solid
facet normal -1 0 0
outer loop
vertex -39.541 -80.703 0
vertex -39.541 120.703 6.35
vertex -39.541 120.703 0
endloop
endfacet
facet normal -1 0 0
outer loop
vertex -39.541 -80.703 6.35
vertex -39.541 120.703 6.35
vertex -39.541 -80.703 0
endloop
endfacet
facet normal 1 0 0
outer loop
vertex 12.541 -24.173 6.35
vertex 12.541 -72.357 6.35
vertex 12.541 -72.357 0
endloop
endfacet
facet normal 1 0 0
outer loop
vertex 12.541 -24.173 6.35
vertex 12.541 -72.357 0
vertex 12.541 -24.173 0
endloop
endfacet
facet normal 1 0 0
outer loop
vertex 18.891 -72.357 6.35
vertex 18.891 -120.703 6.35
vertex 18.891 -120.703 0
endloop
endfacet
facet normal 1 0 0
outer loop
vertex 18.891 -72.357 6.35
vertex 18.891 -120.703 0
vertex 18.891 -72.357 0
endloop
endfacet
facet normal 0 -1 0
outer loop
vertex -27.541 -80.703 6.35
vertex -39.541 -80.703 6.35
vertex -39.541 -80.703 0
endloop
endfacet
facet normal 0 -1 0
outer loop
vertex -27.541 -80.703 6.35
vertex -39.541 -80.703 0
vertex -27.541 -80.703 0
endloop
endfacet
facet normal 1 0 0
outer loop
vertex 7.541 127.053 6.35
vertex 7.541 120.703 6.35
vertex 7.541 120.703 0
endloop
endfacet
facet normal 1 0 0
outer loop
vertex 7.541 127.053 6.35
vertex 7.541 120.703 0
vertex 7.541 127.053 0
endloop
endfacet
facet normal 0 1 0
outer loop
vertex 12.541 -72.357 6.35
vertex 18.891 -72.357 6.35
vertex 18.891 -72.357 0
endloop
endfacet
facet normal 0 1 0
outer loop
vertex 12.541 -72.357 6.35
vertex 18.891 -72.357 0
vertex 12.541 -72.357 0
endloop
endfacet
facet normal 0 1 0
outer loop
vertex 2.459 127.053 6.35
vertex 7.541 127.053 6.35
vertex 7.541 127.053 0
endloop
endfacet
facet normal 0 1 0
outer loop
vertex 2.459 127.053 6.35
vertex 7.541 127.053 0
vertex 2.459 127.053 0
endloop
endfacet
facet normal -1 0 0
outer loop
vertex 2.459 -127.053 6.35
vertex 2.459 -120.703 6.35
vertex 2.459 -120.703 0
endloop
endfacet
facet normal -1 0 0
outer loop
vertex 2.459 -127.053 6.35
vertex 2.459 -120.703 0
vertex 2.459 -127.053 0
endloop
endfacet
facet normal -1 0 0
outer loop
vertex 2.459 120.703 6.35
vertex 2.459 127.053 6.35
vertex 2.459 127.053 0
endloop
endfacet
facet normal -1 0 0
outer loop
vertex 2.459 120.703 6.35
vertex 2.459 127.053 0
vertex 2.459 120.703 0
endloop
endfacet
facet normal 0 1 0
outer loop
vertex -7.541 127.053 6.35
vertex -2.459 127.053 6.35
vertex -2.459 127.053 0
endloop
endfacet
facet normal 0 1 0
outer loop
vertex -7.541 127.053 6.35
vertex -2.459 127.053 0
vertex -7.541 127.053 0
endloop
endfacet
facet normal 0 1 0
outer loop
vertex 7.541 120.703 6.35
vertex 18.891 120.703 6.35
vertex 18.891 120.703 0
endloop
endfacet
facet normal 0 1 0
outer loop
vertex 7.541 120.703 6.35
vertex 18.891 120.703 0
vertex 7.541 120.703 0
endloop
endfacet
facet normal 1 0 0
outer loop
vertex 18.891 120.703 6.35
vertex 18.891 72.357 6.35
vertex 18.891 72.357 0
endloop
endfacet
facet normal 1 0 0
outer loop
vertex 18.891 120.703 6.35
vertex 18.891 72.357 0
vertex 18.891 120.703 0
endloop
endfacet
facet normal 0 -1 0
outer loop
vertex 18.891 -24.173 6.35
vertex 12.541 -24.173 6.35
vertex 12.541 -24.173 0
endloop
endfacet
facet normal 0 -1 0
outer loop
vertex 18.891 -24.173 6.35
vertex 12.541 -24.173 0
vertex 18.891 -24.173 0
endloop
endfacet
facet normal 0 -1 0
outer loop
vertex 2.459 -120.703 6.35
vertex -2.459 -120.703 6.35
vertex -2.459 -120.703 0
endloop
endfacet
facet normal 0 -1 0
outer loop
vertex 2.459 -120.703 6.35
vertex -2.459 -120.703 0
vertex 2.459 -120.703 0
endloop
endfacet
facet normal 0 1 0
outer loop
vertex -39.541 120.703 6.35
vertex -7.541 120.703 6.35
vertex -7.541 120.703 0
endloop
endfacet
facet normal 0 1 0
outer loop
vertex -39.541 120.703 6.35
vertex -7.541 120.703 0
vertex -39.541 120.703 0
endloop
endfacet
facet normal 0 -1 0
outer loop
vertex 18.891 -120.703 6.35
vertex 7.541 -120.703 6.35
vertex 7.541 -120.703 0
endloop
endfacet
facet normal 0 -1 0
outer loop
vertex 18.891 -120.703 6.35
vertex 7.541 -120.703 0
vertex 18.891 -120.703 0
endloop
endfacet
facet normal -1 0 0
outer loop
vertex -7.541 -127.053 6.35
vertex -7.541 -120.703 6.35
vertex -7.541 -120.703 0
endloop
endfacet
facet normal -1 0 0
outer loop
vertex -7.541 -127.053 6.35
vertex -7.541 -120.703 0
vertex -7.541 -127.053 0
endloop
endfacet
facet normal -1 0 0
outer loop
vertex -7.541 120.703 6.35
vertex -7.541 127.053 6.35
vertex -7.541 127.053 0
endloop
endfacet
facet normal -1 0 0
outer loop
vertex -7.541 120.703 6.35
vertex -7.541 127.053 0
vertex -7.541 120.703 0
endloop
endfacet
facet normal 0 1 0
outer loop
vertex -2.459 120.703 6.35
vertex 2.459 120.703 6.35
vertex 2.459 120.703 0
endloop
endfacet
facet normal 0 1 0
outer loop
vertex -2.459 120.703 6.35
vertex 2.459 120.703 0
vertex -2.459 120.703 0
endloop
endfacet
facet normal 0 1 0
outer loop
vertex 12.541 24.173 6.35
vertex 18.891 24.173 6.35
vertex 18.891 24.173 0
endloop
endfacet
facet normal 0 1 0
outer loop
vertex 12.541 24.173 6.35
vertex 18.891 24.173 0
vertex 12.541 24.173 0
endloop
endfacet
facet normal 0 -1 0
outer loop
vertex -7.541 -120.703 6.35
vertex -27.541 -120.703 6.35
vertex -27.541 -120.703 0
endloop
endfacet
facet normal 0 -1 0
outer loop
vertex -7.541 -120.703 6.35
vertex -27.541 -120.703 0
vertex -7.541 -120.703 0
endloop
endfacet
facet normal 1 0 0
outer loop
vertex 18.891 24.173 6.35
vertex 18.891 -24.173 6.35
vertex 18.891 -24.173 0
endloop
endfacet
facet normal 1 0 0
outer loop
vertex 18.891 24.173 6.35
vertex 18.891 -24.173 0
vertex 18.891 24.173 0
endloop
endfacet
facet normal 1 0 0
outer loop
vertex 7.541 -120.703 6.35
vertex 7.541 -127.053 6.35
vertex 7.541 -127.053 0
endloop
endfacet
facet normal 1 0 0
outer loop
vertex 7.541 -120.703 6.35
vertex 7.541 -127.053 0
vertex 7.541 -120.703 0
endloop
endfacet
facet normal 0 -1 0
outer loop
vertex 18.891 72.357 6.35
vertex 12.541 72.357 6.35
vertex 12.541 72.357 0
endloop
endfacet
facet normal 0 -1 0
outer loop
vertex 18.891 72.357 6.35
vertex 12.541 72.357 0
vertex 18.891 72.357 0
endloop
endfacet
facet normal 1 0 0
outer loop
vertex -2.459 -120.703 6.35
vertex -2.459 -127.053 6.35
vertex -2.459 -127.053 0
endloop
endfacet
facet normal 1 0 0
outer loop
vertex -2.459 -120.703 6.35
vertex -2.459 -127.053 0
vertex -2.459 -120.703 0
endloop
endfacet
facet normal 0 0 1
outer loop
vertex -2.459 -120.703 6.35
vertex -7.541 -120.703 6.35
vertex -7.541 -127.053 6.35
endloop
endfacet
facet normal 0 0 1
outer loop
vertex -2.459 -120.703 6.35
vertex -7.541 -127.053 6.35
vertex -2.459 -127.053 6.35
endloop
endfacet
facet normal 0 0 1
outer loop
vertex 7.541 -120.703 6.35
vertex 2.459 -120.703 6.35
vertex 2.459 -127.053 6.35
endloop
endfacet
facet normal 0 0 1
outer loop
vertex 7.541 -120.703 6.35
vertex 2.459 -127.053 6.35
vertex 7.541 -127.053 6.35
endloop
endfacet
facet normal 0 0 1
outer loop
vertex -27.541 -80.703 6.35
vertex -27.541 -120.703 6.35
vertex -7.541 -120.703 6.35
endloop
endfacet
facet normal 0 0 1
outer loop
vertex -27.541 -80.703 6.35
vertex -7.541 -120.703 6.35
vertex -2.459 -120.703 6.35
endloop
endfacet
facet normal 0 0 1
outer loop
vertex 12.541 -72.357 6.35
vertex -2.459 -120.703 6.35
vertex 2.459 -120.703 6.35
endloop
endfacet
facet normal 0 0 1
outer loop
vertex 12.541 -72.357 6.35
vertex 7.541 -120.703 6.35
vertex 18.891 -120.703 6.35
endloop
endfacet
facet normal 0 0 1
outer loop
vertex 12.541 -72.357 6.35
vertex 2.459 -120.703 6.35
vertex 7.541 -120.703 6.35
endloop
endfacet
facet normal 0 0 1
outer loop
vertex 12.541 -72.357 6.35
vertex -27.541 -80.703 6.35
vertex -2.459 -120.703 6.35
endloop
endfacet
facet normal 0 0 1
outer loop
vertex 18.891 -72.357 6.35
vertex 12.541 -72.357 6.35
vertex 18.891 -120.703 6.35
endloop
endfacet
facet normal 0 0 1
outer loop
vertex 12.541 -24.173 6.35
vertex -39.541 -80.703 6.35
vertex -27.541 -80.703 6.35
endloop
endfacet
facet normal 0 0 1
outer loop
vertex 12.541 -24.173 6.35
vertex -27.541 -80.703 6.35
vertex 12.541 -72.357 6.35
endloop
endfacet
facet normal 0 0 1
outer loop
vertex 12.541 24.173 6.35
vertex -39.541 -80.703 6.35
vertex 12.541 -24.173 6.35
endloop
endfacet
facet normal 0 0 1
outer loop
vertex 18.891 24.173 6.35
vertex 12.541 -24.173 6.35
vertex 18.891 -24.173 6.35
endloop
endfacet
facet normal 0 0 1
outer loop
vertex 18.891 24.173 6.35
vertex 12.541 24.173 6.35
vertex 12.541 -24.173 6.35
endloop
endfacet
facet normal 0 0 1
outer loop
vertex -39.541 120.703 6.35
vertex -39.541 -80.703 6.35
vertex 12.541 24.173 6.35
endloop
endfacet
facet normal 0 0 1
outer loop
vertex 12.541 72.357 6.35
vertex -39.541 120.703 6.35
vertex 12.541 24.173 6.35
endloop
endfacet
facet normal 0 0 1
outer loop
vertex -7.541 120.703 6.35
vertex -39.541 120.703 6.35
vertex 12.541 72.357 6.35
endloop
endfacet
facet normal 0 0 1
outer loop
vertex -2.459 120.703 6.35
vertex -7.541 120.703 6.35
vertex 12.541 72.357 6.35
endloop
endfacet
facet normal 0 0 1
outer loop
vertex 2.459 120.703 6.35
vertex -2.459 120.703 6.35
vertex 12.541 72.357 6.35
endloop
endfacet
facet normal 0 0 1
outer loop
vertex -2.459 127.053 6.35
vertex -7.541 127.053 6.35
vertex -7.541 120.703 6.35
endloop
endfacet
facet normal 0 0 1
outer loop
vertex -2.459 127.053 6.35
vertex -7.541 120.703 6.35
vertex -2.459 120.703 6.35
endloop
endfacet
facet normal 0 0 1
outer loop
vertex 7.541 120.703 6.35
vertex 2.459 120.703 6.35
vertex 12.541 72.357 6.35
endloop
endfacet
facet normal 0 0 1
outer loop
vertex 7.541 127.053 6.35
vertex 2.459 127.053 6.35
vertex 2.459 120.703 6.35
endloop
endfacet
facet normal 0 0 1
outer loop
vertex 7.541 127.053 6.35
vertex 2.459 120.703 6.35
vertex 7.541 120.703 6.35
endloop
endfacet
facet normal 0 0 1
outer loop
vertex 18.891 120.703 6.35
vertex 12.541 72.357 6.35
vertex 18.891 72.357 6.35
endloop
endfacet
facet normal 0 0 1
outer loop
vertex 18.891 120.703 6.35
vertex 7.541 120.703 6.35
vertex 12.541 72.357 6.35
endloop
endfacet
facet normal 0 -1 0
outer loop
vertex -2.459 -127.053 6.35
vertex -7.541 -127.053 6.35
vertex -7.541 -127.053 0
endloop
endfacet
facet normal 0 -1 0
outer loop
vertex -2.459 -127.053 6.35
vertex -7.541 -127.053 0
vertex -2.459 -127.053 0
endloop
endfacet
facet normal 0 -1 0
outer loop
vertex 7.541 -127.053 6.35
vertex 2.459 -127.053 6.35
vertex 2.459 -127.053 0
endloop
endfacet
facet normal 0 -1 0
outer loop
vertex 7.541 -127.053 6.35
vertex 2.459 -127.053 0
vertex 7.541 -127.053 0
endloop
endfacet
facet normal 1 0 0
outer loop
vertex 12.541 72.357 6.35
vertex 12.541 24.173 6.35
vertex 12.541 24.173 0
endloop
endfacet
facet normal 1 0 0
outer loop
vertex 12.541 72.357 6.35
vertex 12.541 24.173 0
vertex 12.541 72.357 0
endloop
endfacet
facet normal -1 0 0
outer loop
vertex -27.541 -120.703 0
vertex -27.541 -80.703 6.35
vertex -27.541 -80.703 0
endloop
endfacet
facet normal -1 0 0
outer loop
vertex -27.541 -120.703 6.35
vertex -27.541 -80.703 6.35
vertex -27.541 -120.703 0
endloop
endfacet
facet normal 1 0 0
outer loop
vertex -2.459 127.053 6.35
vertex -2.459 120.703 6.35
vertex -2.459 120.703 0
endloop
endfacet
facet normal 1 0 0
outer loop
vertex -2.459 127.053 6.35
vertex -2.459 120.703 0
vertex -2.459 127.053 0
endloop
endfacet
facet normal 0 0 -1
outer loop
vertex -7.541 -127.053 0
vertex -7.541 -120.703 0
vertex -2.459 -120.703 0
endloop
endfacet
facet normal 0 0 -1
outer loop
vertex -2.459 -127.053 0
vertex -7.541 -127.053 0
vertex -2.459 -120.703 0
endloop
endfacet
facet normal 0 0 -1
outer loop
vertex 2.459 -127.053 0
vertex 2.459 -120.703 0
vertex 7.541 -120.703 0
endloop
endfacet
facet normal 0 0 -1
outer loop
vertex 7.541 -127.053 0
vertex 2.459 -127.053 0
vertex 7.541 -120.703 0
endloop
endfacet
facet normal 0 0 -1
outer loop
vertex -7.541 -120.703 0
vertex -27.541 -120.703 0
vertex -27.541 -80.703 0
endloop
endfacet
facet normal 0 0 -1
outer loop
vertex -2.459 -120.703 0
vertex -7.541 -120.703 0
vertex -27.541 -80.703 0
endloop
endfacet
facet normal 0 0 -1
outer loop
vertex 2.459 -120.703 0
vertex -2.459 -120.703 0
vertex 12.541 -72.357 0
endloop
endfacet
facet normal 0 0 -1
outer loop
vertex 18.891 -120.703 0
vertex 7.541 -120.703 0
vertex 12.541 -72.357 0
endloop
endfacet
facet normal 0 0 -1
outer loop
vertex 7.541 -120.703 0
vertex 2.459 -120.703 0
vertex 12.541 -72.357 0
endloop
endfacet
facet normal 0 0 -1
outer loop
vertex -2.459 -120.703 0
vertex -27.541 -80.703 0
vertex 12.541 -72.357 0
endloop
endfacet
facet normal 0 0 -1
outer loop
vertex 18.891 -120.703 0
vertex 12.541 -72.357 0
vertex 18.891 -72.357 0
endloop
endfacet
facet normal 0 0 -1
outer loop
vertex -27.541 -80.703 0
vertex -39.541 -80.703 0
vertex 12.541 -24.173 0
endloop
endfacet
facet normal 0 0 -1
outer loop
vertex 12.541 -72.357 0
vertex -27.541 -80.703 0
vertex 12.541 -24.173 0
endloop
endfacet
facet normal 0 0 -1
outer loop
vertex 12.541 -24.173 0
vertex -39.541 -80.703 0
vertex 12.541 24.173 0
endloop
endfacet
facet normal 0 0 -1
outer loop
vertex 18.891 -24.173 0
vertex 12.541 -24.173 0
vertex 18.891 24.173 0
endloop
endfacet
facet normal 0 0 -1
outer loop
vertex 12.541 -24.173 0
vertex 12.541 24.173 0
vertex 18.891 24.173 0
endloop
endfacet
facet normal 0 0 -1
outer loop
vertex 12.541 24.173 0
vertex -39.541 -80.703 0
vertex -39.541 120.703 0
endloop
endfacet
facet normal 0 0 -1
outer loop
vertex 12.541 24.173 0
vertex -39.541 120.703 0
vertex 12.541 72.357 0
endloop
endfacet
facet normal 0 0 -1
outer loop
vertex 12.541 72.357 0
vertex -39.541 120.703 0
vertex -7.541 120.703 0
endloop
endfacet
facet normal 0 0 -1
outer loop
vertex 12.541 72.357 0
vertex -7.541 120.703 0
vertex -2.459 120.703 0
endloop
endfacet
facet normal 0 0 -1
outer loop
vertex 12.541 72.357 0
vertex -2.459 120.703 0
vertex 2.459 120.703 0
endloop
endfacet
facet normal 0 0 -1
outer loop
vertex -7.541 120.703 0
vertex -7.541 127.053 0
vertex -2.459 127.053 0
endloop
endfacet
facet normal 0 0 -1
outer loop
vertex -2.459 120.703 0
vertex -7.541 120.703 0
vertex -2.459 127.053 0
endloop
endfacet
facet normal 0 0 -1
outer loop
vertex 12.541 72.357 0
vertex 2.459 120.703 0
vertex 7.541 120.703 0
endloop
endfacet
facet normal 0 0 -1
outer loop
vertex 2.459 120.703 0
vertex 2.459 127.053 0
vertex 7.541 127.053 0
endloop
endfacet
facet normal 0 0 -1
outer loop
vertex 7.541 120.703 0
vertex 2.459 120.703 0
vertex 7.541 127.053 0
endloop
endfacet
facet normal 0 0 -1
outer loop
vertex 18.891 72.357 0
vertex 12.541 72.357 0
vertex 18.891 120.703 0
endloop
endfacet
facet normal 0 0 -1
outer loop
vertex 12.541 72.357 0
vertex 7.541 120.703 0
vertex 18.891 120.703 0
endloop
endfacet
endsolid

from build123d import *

# Parameters (mm, degrees)
BOSS_EXTRUDE1_DEPTH = 6.35
BOSS_EXTRUDE2_DEPTH = 6.35


with BuildPart() as part:
    # Sketch1 → Boss-Extrude1 (new body)
    with BuildSketch(Plane.XY):
        Polygon((12.5, 72.3975), (18.85, 72.3975), (18.85, 120.6625), (7.5, 120.6625), (7.5, 127.0125), (2.5, 127.0125), (2.5, 120.6625), (-2.5, 120.6625), (-2.5, 127.0125), (-7.5, 127.0125), (-7.5, 120.6625), (-39.5, 120.6625), (-39.5, -80.6625), (-27.5, -80.6625), (-27.5, -120.6625), (-7.5, -120.6625), (-7.5, -127.0125), (-2.5, -127.0125), (-2.5, -120.6625), (2.5, -120.6625), (2.5, -127.0125), (7.5, -127.0125), (7.5, -120.6625), (18.85, -120.6625), (18.85, -72.3975), (12.5, -72.3975), (12.5, -24.1325), (18.85, -24.1325), (18.85, 24.1325), (12.5, 24.1325), align=None)
    extrude(amount=BOSS_EXTRUDE1_DEPTH)

    # Sketch3 → Boss-Extrude2 (add)
    with BuildSketch(Plane.XY.offset(6.35)):
        Polygon((-27.54064, -80.70314), (-27.54064, -120.70314), (-7.54064, -120.70314), (-7.54064, -127.05314), (-2.45936, -127.05314), (-2.45936, -120.70314), (2.45936, -120.70314), (2.45936, -127.05314), (7.54064, -127.05314), (7.54064, -120.70314), (18.89064, -120.70314), (18.89064, -72.35686), (12.54064, -72.35686), (12.54064, -24.17314), (18.89064, -24.17314), (18.89064, 24.17314), (12.54064, 24.17314), (12.54064, 72.35686), (18.89064, 72.35686), (18.89064, 120.70314), (7.54064, 120.70314), (7.54064, 127.05314), (2.45936, 127.05314), (2.45936, 120.70314), (-2.45936, 120.70314), (-2.45936, 127.05314), (-7.54064, 127.05314), (-7.54064, 120.70314), (-39.54064, 120.70314), (-39.54064, -80.70314), align=None)
    extrude(amount=-BOSS_EXTRUDE2_DEPTH)


solid = part.part
